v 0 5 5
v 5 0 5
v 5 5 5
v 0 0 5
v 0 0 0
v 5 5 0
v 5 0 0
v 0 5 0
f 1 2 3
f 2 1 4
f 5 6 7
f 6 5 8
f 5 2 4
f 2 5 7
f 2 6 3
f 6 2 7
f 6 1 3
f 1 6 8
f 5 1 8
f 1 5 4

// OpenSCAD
// `!` and `%` on the SAME statement — the node that becomes the root is
// background, and OpenSCAD ignores that.
//
// WHY IT WAS CHOSEN. It is the fourth corner of the `!`/`%` square:
// `edge_modifier_root` is `!` alone, `edge_modifier_background` is `%` alone,
// `edge_modifier_root_in_background` is `!` under `%`, and this is the two of
// them on one statement. All four corners score `SAME` today; only the two
// combinations ever scored anything else.
//
// WHAT IT WOULD CATCH, AND THE ASYMMETRY THAT MAKES IT NON-OBVIOUS.
// `GeometryEvaluator` skips a background CHILD — `collectChildren3D` opens with
// `if (chnode->modinst->isBackground()) continue;` — and nothing anywhere checks
// the background flag on the ROOT node itself. So `%` is honoured on a child and
// ignored on the root, from one rule, and guessing which way it goes gets it
// wrong half the time. Measured at openscad 2026.08.07: this file exports 12
// facets of cube, 125 mm³. We exported NOTHING.
//
// 🔴 THIS CASE CANNOT GO RED ON THE DEFECT IT WAS WRITTEN FOR, AND THAT IS
// MEASURED, NOT SUSPECTED. Planting "the `%`-on-the-root unwrap removed" — the
// exact pre-`d749b176c2` behaviour — scores **`REFUSED`**, not `DIVERGES`: the
// `%` names itself, the root sink stays empty, nothing is emitted, and `CAD1`
// treats a refusal as safe. The first draft of this header asserted `DIVERGES`
// for that plant and the plant said otherwise.
//
// ⚠ AND NO CONTROL SOLID CAN FIX IT, WHICH IS A PROPERTY OF `!` RATHER THAN OF
// THIS FILE. A working root modifier suppresses every sibling, so an
// unconditional control solid CANNOT COEXIST with the construct under test —
// the convention from `6425ea855e` is inapplicable here, not merely omitted.
// The sphere below is the weaker thing that is available: a control of the
// OPPOSITE polarity, suppressed when `!` works and released when it breaks.
//
// What that buys is real but narrower than "covered", so it is stated as a
// list rather than a claim. It goes red on a regression that RELEASES the
// sibling — `!*`'s annihilation guard wrongly generalised from `*` to `%` is a
// plausible one, and it is the plant below. It stays green on a regression that
// emits NOTHING. The second half is watched by
// `web/tests/cad-modifier-interactions.test.ts`, which asserts the geometry
// directly and does not have a refusal verdict to hide behind.
//
// ⚠ `%!cube(5);` — the same two characters the other way round — needs no case
// and no special handling: the `%` wrapper evaluates its body and the `!` inside
// uses its own sink, which is the path `edge_modifier_root_in_background`
// already exercises.
//
// Decidability: one solid, whichever side of the defect the run is on.
//
// PLANTED (throwaway copy of `web/src/cad/scad.ts`, md5-verified against the
// live file before the edit; openscad 2026.08.07; full 81-case corpus each run):
//   · the `*`-annihilation guard generalised from `*` to `%`  -> DIVERGES ✅
//     (this case only — SAME 63->62, DIVERGES 4->5)
//   · the `%`-on-the-root unwrap removed (the original defect) -> 🔴 REFUSED,
//     i.e. INVISIBLE TO `CAD1` (this case only — SAME 63->62, REFUSED 14->15)
!%cube(5);
sphere(20, $fn = 16);
